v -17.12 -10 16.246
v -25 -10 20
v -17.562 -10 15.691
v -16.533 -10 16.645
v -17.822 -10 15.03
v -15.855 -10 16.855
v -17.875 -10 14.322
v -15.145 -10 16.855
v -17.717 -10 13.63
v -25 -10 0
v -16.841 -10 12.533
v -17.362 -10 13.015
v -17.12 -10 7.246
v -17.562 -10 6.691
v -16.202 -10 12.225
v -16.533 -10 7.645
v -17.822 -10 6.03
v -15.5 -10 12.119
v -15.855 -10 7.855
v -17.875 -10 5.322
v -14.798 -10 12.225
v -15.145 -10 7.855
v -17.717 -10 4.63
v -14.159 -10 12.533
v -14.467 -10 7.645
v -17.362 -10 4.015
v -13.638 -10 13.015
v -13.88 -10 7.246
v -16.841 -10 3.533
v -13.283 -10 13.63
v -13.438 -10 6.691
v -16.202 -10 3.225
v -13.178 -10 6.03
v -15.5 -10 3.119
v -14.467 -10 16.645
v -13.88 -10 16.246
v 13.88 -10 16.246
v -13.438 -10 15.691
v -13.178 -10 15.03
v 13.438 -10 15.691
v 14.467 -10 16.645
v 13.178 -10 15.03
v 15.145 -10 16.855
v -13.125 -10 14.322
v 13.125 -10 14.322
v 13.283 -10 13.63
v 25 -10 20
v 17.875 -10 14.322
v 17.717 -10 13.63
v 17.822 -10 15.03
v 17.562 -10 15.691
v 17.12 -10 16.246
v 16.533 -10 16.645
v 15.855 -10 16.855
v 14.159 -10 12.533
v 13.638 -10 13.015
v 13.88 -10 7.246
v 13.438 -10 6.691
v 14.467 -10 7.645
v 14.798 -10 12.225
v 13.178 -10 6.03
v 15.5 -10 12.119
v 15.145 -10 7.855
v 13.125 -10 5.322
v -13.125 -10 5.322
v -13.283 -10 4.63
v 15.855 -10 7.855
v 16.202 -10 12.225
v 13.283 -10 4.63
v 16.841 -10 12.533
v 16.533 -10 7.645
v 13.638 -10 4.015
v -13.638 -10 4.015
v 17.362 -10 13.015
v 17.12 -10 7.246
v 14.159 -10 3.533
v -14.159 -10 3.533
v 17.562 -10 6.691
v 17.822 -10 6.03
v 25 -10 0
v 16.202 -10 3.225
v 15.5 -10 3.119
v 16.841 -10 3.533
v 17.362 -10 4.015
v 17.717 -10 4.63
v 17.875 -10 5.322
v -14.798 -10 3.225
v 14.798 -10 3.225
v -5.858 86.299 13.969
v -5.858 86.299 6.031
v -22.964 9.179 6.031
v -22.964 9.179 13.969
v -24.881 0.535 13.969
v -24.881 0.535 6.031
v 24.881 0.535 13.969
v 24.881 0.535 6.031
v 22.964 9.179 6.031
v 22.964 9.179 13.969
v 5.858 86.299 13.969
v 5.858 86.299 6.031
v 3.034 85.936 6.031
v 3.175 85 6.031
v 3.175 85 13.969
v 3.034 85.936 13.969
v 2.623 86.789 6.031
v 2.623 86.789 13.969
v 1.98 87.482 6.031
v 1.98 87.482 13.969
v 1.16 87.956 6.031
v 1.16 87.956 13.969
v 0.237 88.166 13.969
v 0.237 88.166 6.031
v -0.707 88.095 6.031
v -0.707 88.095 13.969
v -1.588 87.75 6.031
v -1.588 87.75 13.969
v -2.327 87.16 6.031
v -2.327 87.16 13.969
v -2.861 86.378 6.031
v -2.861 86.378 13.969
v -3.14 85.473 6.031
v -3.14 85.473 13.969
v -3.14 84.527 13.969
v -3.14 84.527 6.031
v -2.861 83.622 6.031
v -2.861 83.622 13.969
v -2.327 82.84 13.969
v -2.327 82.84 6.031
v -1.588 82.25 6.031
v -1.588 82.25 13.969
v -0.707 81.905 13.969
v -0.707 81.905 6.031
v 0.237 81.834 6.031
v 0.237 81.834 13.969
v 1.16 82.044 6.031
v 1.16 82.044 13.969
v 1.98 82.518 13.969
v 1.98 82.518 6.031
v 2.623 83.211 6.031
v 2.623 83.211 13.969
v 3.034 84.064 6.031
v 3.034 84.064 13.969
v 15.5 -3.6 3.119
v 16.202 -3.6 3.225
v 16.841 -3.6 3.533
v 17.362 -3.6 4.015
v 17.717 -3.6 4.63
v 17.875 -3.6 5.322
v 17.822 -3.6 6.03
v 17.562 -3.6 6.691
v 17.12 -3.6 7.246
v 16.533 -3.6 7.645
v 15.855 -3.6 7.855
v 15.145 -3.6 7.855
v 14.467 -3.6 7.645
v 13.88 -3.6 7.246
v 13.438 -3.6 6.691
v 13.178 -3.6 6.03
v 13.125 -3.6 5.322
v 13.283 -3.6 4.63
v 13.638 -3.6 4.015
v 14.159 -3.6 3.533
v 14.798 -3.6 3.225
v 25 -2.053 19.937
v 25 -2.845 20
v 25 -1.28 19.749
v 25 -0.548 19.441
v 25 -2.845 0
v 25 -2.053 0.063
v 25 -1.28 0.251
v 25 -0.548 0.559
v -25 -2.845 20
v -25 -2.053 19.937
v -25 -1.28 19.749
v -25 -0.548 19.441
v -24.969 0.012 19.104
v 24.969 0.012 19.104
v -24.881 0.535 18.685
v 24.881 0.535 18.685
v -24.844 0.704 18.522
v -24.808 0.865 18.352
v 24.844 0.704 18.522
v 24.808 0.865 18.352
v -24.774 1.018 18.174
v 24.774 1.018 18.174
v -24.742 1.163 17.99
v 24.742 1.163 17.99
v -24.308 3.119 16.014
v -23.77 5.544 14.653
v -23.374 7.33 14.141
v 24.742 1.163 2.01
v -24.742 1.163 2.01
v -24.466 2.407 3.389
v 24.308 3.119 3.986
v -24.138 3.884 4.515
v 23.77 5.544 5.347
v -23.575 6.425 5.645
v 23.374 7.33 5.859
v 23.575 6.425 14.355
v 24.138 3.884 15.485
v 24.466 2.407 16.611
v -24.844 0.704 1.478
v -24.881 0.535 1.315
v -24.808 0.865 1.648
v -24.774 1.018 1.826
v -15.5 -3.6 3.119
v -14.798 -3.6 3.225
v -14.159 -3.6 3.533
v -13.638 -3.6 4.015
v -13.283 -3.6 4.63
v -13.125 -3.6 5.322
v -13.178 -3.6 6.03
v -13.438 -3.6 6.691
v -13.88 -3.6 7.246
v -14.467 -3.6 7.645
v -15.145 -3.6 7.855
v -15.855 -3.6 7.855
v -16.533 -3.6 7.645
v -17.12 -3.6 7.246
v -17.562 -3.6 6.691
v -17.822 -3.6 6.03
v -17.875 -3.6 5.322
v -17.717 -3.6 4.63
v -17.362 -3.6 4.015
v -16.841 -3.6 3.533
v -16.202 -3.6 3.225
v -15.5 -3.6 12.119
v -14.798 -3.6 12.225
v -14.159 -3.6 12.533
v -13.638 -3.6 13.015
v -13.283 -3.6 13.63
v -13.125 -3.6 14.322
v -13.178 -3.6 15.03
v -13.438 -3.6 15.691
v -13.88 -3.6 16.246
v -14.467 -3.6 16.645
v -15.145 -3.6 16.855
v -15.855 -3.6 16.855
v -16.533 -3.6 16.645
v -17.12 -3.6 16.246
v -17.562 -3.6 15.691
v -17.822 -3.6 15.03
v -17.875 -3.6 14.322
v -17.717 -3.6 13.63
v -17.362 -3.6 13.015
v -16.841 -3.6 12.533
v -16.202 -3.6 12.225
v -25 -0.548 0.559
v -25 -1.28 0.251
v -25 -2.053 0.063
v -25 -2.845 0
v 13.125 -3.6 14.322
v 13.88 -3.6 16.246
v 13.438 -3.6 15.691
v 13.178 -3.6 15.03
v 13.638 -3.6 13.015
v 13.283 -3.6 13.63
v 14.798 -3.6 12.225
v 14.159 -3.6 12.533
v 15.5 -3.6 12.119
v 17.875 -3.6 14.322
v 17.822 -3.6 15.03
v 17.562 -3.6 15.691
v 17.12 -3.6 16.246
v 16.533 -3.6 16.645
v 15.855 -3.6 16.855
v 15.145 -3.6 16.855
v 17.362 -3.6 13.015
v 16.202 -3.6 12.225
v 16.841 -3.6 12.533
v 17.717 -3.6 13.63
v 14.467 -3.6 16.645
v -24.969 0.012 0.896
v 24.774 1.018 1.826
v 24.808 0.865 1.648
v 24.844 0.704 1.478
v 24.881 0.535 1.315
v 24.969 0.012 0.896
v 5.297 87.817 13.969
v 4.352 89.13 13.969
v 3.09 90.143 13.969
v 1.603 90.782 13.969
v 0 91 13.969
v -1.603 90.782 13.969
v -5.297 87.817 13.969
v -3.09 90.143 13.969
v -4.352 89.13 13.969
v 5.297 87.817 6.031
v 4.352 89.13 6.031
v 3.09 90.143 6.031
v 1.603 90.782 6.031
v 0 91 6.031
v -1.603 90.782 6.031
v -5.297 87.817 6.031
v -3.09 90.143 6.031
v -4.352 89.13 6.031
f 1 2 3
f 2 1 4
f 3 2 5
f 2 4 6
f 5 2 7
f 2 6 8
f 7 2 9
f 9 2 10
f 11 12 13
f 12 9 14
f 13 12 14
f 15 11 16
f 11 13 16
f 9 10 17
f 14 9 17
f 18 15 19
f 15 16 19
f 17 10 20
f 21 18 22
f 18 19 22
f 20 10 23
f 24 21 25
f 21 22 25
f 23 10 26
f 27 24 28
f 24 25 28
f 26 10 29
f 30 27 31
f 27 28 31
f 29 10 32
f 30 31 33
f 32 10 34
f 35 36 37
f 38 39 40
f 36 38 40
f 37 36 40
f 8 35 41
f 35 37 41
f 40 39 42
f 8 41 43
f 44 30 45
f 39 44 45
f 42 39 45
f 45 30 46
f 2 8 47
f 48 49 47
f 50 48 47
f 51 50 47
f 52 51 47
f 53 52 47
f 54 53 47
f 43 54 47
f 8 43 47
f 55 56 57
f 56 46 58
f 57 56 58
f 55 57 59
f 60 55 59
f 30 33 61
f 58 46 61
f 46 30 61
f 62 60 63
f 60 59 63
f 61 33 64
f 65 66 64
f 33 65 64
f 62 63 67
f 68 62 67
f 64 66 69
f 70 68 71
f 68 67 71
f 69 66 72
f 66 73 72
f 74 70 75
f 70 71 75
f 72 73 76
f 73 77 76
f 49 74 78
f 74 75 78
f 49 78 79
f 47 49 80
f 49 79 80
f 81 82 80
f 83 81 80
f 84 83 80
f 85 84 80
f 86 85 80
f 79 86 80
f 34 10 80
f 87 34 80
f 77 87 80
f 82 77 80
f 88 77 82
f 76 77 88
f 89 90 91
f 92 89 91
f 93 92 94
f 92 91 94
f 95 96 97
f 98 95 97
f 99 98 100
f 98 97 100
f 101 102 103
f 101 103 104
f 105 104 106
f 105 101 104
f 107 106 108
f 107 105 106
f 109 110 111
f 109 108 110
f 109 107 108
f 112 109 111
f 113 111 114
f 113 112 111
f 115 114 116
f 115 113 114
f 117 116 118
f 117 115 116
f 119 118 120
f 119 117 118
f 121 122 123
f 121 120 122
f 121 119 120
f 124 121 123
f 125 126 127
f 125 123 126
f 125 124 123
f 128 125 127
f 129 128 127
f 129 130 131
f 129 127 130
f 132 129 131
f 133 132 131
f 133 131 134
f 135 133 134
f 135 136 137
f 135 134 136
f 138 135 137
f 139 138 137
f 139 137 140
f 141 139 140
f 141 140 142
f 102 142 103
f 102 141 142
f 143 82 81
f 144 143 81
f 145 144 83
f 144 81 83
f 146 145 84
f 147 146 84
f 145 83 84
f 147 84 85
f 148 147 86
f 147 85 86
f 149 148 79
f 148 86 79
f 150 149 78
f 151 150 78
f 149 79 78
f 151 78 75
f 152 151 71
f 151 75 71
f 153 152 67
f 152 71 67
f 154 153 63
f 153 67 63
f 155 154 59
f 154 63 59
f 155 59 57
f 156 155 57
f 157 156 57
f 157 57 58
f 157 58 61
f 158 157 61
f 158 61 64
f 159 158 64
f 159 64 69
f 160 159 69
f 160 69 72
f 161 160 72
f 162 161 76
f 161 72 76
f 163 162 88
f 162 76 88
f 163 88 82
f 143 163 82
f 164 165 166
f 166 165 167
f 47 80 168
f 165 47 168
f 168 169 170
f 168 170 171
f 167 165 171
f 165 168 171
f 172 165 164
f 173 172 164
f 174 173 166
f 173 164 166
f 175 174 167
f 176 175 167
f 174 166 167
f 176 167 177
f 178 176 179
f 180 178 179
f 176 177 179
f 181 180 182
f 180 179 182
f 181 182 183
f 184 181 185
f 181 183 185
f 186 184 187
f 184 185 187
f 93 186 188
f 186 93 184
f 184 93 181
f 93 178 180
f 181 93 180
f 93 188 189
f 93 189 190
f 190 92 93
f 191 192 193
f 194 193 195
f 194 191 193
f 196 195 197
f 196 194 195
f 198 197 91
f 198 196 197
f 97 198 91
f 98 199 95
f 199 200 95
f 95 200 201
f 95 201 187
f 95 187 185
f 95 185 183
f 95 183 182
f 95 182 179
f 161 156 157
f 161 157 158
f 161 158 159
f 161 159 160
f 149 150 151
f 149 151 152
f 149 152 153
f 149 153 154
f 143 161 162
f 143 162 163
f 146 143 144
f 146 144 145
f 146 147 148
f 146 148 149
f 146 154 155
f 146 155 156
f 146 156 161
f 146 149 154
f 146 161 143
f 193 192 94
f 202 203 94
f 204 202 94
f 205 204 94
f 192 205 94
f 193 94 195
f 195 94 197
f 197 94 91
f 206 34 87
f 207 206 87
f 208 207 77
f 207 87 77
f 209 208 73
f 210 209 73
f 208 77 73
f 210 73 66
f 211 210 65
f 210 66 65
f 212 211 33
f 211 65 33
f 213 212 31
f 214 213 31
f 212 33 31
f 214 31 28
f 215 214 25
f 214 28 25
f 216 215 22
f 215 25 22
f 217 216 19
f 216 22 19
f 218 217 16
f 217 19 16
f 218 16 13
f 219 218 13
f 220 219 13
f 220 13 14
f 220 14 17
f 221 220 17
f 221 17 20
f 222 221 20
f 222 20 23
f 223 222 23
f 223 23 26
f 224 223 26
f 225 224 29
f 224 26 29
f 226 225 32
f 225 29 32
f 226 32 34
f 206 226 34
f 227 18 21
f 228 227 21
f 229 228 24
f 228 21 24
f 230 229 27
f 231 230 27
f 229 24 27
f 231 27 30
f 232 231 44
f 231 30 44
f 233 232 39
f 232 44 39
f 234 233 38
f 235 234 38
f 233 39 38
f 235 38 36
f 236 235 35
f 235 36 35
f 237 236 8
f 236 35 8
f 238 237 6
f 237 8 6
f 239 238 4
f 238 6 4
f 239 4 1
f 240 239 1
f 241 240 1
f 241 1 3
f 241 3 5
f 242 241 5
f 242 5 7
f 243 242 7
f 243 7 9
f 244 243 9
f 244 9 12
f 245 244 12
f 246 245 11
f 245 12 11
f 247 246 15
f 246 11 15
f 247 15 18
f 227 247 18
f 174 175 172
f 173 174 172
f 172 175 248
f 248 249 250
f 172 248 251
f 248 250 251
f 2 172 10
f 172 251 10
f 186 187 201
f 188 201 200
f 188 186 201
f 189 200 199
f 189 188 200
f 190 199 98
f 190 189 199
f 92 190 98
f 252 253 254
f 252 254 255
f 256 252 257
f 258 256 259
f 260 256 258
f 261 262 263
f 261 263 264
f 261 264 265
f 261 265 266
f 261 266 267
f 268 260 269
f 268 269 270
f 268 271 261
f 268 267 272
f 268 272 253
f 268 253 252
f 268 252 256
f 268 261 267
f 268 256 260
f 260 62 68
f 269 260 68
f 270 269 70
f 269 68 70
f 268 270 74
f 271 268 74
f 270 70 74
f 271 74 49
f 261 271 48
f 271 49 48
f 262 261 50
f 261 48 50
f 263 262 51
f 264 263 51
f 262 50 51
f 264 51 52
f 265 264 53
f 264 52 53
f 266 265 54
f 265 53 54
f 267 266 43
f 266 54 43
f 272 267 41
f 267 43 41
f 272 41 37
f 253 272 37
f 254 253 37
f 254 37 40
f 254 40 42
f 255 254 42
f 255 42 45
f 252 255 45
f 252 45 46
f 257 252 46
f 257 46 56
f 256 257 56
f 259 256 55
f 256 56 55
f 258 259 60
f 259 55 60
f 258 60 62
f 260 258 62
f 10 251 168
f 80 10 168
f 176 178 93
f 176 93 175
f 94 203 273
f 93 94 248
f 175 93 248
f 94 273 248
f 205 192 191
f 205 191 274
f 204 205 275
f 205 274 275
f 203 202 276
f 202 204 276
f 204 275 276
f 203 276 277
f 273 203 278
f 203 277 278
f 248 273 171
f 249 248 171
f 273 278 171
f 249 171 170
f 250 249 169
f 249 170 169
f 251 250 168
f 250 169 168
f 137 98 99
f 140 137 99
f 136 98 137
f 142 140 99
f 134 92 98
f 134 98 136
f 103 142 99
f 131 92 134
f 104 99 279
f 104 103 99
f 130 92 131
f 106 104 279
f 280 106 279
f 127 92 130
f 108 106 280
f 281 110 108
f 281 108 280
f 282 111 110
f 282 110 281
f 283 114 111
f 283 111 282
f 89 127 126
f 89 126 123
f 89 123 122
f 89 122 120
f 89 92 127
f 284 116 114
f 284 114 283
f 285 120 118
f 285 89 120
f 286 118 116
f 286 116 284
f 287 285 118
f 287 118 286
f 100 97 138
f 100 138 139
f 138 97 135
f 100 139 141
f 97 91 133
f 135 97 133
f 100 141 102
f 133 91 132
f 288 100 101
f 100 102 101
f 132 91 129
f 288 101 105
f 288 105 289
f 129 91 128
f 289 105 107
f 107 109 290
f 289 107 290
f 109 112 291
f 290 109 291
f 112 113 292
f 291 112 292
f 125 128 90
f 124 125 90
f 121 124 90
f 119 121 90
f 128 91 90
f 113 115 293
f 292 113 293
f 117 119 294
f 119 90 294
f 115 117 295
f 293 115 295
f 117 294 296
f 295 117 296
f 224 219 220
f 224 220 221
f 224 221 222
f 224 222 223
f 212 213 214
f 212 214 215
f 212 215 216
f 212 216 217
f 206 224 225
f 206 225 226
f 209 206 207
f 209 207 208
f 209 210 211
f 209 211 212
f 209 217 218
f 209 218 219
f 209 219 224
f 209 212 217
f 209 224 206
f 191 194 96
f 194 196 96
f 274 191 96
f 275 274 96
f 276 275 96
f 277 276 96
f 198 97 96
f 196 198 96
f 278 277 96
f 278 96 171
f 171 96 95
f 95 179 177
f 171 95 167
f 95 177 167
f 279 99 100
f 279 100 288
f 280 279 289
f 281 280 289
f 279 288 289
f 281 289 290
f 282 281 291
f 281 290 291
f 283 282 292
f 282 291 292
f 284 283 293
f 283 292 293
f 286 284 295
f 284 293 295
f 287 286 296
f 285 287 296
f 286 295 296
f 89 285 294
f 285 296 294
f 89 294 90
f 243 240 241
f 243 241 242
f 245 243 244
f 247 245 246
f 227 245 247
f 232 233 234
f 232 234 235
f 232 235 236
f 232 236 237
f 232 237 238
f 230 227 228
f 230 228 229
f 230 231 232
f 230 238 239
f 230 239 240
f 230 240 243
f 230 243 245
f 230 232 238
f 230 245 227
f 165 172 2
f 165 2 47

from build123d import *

# Parameters (mm, degrees)
SKETCH1_R               = 3.175
BOSS_EXTRUDE1_DEPTH     = 20
CUT_EXTRUDE1_DEPTH      = 25
CUT_EXTRUDE1_DEPTH_BACK = 25
SKETCH2_W               = 6.03125
SKETCH2_H               = 91
FILLET1_R               = 10
FILLET2_R               = 5
SKETCH3_R               = 2.38125
CUT_EXTRUDE2_DEPTH      = 6.4


with BuildPart() as part:
    # Sketch1 → Boss-Extrude1 (new body)
    with BuildSketch(Plane.XY):
        with BuildLine():
            Line((-5.85762861, 86.299302532), (-25, 0))
            Line((-25, 0), (-25, -10))
            Line((-25, -10), (25, -10))
            Line((25, -10), (25, 0))
            Line((25, 0), (5.85762861, 86.299302532))
            ThreePointArc((5.85762861, 86.299302532), (0, 91), (-5.85762861, 86.299302532))
        make_face()
        with Locations((0, 85)):
            Circle(SKETCH1_R, mode=Mode.SUBTRACT)
    extrude(amount=BOSS_EXTRUDE1_DEPTH)

    # Sketch2 → Cut-Extrude1 (cut, two sides: drawn at the far end of the back side and taken through both)
    with BuildSketch(Plane(origin=(0, 0, 0), x_dir=(0, 0, -1), z_dir=(1, 0, 0)).offset(-CUT_EXTRUDE1_DEPTH_BACK)):
        with Locations((-16.984375, 45.5)):
            Rectangle(SKETCH2_W, SKETCH2_H)
        with Locations((-3.015625, 45.5)):
            Rectangle(SKETCH2_W, SKETCH2_H)
    extrude(amount=CUT_EXTRUDE1_DEPTH + CUT_EXTRUDE1_DEPTH_BACK, mode=Mode.SUBTRACT)

    # Fillet1
    # the kernel refuses this fillet: 10 mm, written as the material it adds along each edge
    with BuildSketch(Plane(origin=(-25, 0, 13.96875), x_dir=(0, 1, 0), z_dir=(1, 0, 0))) as fillet1_piece_1_section:
        with BuildLine():
            CenterArc((9.178726678, 10), FILLET1_R, 203.382964427, 66.617035573)
            Line((0, 6.03125), (-0.183574534, 5.951875))
            ThreePointArc((-0.183574534, 5.951875), (-0.2, 3.015625), (-0.2, 0))
            Line((-0.2, 0), (0, -0.2))
            Line((0, -0.2), (9.178726678, -0.2))
            Line((9.178726678, -0.2), (9.178726678, 0))
        make_face()
    fillet1_piece_1 = extrude(amount=50, mode=Mode.PRIVATE)
    fillet1_piece_1 = split(fillet1_piece_1, bisect_by=Plane(origin=(23.363313282, 7.378653319, 15.543546825), z_dir=(-0.9762714349563381, -0.2165504220459817, 0)), keep=Keep.TOP, mode=Mode.PRIVATE)
    fillet1_piece_1 = split(fillet1_piece_1, bisect_by=Plane(origin=(-23.363313282, 7.378653319, 15.543546825), z_dir=(0.9762714349563381, -0.2165504220459817, 0)), keep=Keep.TOP, mode=Mode.PRIVATE)
    add(fillet1_piece_1)
    with BuildSketch(Plane(origin=(25, 0, 6.03125), x_dir=(0, 1, 0), z_dir=(-1, 0, 0))) as fillet1_piece_2_section:
        with BuildLine():
            CenterArc((9.178726678, 10), FILLET1_R, 203.382964427, 66.617035573)
            Line((0, 6.03125), (-0.183574534, 5.951875))
            ThreePointArc((-0.183574534, 5.951875), (-0.2, 3.015625), (-0.2, 0))
            Line((-0.2, 0), (0, -0.2))
            Line((0, -0.2), (9.178726678, -0.2))
            Line((9.178726678, -0.2), (9.178726678, 0))
        make_face()
    fillet1_piece_2 = extrude(amount=50, mode=Mode.PRIVATE)
    fillet1_piece_2 = split(fillet1_piece_2, bisect_by=Plane(origin=(23.363313282, 7.378653319, 4.456453175), z_dir=(-0.9762714349563381, -0.2165504220459817, 0)), keep=Keep.TOP, mode=Mode.PRIVATE)
    fillet1_piece_2 = split(fillet1_piece_2, bisect_by=Plane(origin=(-23.363313282, 7.378653319, 4.456453175), z_dir=(0.9762714349563381, -0.2165504220459817, 0)), keep=Keep.TOP, mode=Mode.PRIVATE)
    add(fillet1_piece_2)

    # Fillet2
    # the kernel refuses this fillet: 5 mm, written as the material it takes off along each edge
    with BuildSketch(Plane(origin=(-25, 0, -1.369690533), x_dir=(0, -1, 0), z_dir=(0, 0, 1)), Plane(origin=(25, 0, 21.369690533), x_dir=(0, -1, 0), z_dir=(0, 0, -1))) as fillet2_piece_1:
        with BuildLine():
            CenterArc((FILLET2_R * 0.109575242659, FILLET2_R), FILLET2_R, 257.493496935, 12.506503065)
            Line((-FILLET2_R * 0.106975179387, FILLET2_R * 0.0237285650437), (0, 0))
            Line((0, 0), (FILLET2_R * 0.109575242659, 0))
        make_face()
    extrude(amount=22.739381066, mode=Mode.SUBTRACT)
    with BuildSketch(Plane(origin=(32.111618418, 0, 0), x_dir=(0, 0.5007842597579724, 0.8655721374782461), z_dir=(-1, 0, 0))) as fillet2_piece_2:
        with BuildLine():
            CenterArc((2.903306061, -4.966168801), FILLET2_R, 96.668935359, 53.279164854)
            Line((-1.424554626, -2.462247502), (0, 0))
            ThreePointArc((0, 0), (1.161322425, -0.067662399), (2.322644849, 0))
        make_face()
    extrude(amount=64.223236835, mode=Mode.SUBTRACT)
    with BuildSketch(Plane(origin=(32.111618418, 0, 20), x_dir=(0, -1, 0), z_dir=(-1, 0, 0))) as fillet2_piece_3:
        with BuildLine():
            CenterArc((2.844647367, -5), FILLET2_R, 90, 53.279164854)
            ThreePointArc((-1.163143981, -2.010416667), (-0.523005304, -1.039092598), (0, 0))
            Line((0, 0), (2.844647367, 0))
        make_face()
    extrude(amount=64.223236835, mode=Mode.SUBTRACT)

    # Sketch3 → Cut-Extrude2 (cut)
    with BuildSketch(Plane.XZ.offset(10)):
        with Locations(Location((-15.5, 14.5, 0), (0, 0, 270))):
            Circle(SKETCH3_R)
        with Locations(Location((-15.5, 5.5, 0), (0, 0, 270))):
            Circle(SKETCH3_R)
        with Locations(Location((15.5, 14.5, 0), (0, 0, 270))):
            Circle(SKETCH3_R)
        with Locations(Location((15.5, 5.5, 0), (0, 0, 270))):
            Circle(SKETCH3_R)
    extrude(amount=-CUT_EXTRUDE2_DEPTH, mode=Mode.SUBTRACT)


solid = part.part
